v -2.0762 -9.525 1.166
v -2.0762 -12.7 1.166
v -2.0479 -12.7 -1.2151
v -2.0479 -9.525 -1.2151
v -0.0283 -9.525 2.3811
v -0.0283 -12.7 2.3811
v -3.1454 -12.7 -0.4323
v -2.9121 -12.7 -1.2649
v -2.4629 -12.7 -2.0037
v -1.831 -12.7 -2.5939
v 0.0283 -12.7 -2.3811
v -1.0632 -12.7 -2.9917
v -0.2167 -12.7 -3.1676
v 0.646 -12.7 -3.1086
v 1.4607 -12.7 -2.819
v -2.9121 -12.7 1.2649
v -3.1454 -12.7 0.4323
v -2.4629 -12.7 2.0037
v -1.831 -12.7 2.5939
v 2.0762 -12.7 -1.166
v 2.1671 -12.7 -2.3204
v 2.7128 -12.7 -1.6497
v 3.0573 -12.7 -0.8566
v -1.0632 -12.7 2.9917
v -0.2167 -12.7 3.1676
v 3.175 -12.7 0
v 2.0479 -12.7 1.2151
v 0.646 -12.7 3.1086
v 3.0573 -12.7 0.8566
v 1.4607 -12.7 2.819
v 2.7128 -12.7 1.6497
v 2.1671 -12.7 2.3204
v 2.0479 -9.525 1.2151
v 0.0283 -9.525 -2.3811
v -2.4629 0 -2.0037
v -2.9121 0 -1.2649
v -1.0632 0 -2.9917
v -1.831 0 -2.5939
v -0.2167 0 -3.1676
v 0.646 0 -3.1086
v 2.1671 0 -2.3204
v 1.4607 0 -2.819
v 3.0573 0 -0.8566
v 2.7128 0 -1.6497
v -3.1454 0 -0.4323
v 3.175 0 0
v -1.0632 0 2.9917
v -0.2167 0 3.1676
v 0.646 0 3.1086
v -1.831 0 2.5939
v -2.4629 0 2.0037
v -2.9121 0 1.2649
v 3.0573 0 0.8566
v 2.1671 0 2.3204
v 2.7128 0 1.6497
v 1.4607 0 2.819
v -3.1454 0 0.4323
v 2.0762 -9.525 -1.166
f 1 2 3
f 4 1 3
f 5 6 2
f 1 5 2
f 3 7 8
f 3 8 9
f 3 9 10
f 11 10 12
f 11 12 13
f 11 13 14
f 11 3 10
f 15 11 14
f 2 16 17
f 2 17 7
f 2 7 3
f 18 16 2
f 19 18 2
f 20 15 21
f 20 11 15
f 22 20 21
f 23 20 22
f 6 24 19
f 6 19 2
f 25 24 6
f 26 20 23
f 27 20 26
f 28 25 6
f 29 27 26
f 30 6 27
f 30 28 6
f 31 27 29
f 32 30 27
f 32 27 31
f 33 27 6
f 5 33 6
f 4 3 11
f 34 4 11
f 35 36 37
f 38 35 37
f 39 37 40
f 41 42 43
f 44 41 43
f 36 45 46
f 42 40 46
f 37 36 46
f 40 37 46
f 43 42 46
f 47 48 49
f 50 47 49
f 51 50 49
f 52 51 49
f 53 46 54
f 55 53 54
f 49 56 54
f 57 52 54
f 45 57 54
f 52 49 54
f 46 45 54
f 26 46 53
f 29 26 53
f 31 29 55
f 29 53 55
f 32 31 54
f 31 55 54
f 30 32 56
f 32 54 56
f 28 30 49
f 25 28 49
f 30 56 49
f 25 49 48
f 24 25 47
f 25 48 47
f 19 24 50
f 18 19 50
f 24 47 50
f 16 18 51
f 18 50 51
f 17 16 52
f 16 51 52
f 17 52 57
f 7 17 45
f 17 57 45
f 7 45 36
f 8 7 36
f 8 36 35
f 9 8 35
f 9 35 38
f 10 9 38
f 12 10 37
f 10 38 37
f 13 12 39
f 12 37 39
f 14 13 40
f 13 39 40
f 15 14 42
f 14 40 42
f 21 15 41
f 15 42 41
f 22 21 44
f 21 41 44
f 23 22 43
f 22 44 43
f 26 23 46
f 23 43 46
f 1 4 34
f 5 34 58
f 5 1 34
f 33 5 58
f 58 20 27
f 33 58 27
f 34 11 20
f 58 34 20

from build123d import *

# Parameters (mm, degrees)
F0_R     = 3.175
F1_DEPTH = 12.7
F3_DEPTH = 3.175
F4_DEPTH = 2.38125


with BuildPart() as f1:
    # F0 (on Front) → F1 (new body)
    with BuildSketch(Plane.XZ):
        Circle(F0_R)
    extrude(amount=F1_DEPTH)

    # F2 (on face) → F3 (cut)
    with BuildSketch(Plane.XZ.offset(12.7)):
        Polygon((-0.028336, 2.381081), (-2.076245, 1.166001), (-2.047909, -1.215081), (0.028336, -2.381081), (2.076245, -1.166001), (2.047909, 1.215081), align=None)
    extrude(amount=-F3_DEPTH, mode=Mode.SUBTRACT)

    # F2 (on face) → F4 (cut)
    with BuildSketch(Plane.XZ.offset(12.7)):
        Polygon((-0.028336, 2.381081), (-2.076245, 1.166001), (-2.047909, -1.215081), (0.028336, -2.381081), (2.076245, -1.166001), (2.047909, 1.215081), align=None)
    extrude(amount=-F4_DEPTH, mode=Mode.SUBTRACT)


solid = f1.part
